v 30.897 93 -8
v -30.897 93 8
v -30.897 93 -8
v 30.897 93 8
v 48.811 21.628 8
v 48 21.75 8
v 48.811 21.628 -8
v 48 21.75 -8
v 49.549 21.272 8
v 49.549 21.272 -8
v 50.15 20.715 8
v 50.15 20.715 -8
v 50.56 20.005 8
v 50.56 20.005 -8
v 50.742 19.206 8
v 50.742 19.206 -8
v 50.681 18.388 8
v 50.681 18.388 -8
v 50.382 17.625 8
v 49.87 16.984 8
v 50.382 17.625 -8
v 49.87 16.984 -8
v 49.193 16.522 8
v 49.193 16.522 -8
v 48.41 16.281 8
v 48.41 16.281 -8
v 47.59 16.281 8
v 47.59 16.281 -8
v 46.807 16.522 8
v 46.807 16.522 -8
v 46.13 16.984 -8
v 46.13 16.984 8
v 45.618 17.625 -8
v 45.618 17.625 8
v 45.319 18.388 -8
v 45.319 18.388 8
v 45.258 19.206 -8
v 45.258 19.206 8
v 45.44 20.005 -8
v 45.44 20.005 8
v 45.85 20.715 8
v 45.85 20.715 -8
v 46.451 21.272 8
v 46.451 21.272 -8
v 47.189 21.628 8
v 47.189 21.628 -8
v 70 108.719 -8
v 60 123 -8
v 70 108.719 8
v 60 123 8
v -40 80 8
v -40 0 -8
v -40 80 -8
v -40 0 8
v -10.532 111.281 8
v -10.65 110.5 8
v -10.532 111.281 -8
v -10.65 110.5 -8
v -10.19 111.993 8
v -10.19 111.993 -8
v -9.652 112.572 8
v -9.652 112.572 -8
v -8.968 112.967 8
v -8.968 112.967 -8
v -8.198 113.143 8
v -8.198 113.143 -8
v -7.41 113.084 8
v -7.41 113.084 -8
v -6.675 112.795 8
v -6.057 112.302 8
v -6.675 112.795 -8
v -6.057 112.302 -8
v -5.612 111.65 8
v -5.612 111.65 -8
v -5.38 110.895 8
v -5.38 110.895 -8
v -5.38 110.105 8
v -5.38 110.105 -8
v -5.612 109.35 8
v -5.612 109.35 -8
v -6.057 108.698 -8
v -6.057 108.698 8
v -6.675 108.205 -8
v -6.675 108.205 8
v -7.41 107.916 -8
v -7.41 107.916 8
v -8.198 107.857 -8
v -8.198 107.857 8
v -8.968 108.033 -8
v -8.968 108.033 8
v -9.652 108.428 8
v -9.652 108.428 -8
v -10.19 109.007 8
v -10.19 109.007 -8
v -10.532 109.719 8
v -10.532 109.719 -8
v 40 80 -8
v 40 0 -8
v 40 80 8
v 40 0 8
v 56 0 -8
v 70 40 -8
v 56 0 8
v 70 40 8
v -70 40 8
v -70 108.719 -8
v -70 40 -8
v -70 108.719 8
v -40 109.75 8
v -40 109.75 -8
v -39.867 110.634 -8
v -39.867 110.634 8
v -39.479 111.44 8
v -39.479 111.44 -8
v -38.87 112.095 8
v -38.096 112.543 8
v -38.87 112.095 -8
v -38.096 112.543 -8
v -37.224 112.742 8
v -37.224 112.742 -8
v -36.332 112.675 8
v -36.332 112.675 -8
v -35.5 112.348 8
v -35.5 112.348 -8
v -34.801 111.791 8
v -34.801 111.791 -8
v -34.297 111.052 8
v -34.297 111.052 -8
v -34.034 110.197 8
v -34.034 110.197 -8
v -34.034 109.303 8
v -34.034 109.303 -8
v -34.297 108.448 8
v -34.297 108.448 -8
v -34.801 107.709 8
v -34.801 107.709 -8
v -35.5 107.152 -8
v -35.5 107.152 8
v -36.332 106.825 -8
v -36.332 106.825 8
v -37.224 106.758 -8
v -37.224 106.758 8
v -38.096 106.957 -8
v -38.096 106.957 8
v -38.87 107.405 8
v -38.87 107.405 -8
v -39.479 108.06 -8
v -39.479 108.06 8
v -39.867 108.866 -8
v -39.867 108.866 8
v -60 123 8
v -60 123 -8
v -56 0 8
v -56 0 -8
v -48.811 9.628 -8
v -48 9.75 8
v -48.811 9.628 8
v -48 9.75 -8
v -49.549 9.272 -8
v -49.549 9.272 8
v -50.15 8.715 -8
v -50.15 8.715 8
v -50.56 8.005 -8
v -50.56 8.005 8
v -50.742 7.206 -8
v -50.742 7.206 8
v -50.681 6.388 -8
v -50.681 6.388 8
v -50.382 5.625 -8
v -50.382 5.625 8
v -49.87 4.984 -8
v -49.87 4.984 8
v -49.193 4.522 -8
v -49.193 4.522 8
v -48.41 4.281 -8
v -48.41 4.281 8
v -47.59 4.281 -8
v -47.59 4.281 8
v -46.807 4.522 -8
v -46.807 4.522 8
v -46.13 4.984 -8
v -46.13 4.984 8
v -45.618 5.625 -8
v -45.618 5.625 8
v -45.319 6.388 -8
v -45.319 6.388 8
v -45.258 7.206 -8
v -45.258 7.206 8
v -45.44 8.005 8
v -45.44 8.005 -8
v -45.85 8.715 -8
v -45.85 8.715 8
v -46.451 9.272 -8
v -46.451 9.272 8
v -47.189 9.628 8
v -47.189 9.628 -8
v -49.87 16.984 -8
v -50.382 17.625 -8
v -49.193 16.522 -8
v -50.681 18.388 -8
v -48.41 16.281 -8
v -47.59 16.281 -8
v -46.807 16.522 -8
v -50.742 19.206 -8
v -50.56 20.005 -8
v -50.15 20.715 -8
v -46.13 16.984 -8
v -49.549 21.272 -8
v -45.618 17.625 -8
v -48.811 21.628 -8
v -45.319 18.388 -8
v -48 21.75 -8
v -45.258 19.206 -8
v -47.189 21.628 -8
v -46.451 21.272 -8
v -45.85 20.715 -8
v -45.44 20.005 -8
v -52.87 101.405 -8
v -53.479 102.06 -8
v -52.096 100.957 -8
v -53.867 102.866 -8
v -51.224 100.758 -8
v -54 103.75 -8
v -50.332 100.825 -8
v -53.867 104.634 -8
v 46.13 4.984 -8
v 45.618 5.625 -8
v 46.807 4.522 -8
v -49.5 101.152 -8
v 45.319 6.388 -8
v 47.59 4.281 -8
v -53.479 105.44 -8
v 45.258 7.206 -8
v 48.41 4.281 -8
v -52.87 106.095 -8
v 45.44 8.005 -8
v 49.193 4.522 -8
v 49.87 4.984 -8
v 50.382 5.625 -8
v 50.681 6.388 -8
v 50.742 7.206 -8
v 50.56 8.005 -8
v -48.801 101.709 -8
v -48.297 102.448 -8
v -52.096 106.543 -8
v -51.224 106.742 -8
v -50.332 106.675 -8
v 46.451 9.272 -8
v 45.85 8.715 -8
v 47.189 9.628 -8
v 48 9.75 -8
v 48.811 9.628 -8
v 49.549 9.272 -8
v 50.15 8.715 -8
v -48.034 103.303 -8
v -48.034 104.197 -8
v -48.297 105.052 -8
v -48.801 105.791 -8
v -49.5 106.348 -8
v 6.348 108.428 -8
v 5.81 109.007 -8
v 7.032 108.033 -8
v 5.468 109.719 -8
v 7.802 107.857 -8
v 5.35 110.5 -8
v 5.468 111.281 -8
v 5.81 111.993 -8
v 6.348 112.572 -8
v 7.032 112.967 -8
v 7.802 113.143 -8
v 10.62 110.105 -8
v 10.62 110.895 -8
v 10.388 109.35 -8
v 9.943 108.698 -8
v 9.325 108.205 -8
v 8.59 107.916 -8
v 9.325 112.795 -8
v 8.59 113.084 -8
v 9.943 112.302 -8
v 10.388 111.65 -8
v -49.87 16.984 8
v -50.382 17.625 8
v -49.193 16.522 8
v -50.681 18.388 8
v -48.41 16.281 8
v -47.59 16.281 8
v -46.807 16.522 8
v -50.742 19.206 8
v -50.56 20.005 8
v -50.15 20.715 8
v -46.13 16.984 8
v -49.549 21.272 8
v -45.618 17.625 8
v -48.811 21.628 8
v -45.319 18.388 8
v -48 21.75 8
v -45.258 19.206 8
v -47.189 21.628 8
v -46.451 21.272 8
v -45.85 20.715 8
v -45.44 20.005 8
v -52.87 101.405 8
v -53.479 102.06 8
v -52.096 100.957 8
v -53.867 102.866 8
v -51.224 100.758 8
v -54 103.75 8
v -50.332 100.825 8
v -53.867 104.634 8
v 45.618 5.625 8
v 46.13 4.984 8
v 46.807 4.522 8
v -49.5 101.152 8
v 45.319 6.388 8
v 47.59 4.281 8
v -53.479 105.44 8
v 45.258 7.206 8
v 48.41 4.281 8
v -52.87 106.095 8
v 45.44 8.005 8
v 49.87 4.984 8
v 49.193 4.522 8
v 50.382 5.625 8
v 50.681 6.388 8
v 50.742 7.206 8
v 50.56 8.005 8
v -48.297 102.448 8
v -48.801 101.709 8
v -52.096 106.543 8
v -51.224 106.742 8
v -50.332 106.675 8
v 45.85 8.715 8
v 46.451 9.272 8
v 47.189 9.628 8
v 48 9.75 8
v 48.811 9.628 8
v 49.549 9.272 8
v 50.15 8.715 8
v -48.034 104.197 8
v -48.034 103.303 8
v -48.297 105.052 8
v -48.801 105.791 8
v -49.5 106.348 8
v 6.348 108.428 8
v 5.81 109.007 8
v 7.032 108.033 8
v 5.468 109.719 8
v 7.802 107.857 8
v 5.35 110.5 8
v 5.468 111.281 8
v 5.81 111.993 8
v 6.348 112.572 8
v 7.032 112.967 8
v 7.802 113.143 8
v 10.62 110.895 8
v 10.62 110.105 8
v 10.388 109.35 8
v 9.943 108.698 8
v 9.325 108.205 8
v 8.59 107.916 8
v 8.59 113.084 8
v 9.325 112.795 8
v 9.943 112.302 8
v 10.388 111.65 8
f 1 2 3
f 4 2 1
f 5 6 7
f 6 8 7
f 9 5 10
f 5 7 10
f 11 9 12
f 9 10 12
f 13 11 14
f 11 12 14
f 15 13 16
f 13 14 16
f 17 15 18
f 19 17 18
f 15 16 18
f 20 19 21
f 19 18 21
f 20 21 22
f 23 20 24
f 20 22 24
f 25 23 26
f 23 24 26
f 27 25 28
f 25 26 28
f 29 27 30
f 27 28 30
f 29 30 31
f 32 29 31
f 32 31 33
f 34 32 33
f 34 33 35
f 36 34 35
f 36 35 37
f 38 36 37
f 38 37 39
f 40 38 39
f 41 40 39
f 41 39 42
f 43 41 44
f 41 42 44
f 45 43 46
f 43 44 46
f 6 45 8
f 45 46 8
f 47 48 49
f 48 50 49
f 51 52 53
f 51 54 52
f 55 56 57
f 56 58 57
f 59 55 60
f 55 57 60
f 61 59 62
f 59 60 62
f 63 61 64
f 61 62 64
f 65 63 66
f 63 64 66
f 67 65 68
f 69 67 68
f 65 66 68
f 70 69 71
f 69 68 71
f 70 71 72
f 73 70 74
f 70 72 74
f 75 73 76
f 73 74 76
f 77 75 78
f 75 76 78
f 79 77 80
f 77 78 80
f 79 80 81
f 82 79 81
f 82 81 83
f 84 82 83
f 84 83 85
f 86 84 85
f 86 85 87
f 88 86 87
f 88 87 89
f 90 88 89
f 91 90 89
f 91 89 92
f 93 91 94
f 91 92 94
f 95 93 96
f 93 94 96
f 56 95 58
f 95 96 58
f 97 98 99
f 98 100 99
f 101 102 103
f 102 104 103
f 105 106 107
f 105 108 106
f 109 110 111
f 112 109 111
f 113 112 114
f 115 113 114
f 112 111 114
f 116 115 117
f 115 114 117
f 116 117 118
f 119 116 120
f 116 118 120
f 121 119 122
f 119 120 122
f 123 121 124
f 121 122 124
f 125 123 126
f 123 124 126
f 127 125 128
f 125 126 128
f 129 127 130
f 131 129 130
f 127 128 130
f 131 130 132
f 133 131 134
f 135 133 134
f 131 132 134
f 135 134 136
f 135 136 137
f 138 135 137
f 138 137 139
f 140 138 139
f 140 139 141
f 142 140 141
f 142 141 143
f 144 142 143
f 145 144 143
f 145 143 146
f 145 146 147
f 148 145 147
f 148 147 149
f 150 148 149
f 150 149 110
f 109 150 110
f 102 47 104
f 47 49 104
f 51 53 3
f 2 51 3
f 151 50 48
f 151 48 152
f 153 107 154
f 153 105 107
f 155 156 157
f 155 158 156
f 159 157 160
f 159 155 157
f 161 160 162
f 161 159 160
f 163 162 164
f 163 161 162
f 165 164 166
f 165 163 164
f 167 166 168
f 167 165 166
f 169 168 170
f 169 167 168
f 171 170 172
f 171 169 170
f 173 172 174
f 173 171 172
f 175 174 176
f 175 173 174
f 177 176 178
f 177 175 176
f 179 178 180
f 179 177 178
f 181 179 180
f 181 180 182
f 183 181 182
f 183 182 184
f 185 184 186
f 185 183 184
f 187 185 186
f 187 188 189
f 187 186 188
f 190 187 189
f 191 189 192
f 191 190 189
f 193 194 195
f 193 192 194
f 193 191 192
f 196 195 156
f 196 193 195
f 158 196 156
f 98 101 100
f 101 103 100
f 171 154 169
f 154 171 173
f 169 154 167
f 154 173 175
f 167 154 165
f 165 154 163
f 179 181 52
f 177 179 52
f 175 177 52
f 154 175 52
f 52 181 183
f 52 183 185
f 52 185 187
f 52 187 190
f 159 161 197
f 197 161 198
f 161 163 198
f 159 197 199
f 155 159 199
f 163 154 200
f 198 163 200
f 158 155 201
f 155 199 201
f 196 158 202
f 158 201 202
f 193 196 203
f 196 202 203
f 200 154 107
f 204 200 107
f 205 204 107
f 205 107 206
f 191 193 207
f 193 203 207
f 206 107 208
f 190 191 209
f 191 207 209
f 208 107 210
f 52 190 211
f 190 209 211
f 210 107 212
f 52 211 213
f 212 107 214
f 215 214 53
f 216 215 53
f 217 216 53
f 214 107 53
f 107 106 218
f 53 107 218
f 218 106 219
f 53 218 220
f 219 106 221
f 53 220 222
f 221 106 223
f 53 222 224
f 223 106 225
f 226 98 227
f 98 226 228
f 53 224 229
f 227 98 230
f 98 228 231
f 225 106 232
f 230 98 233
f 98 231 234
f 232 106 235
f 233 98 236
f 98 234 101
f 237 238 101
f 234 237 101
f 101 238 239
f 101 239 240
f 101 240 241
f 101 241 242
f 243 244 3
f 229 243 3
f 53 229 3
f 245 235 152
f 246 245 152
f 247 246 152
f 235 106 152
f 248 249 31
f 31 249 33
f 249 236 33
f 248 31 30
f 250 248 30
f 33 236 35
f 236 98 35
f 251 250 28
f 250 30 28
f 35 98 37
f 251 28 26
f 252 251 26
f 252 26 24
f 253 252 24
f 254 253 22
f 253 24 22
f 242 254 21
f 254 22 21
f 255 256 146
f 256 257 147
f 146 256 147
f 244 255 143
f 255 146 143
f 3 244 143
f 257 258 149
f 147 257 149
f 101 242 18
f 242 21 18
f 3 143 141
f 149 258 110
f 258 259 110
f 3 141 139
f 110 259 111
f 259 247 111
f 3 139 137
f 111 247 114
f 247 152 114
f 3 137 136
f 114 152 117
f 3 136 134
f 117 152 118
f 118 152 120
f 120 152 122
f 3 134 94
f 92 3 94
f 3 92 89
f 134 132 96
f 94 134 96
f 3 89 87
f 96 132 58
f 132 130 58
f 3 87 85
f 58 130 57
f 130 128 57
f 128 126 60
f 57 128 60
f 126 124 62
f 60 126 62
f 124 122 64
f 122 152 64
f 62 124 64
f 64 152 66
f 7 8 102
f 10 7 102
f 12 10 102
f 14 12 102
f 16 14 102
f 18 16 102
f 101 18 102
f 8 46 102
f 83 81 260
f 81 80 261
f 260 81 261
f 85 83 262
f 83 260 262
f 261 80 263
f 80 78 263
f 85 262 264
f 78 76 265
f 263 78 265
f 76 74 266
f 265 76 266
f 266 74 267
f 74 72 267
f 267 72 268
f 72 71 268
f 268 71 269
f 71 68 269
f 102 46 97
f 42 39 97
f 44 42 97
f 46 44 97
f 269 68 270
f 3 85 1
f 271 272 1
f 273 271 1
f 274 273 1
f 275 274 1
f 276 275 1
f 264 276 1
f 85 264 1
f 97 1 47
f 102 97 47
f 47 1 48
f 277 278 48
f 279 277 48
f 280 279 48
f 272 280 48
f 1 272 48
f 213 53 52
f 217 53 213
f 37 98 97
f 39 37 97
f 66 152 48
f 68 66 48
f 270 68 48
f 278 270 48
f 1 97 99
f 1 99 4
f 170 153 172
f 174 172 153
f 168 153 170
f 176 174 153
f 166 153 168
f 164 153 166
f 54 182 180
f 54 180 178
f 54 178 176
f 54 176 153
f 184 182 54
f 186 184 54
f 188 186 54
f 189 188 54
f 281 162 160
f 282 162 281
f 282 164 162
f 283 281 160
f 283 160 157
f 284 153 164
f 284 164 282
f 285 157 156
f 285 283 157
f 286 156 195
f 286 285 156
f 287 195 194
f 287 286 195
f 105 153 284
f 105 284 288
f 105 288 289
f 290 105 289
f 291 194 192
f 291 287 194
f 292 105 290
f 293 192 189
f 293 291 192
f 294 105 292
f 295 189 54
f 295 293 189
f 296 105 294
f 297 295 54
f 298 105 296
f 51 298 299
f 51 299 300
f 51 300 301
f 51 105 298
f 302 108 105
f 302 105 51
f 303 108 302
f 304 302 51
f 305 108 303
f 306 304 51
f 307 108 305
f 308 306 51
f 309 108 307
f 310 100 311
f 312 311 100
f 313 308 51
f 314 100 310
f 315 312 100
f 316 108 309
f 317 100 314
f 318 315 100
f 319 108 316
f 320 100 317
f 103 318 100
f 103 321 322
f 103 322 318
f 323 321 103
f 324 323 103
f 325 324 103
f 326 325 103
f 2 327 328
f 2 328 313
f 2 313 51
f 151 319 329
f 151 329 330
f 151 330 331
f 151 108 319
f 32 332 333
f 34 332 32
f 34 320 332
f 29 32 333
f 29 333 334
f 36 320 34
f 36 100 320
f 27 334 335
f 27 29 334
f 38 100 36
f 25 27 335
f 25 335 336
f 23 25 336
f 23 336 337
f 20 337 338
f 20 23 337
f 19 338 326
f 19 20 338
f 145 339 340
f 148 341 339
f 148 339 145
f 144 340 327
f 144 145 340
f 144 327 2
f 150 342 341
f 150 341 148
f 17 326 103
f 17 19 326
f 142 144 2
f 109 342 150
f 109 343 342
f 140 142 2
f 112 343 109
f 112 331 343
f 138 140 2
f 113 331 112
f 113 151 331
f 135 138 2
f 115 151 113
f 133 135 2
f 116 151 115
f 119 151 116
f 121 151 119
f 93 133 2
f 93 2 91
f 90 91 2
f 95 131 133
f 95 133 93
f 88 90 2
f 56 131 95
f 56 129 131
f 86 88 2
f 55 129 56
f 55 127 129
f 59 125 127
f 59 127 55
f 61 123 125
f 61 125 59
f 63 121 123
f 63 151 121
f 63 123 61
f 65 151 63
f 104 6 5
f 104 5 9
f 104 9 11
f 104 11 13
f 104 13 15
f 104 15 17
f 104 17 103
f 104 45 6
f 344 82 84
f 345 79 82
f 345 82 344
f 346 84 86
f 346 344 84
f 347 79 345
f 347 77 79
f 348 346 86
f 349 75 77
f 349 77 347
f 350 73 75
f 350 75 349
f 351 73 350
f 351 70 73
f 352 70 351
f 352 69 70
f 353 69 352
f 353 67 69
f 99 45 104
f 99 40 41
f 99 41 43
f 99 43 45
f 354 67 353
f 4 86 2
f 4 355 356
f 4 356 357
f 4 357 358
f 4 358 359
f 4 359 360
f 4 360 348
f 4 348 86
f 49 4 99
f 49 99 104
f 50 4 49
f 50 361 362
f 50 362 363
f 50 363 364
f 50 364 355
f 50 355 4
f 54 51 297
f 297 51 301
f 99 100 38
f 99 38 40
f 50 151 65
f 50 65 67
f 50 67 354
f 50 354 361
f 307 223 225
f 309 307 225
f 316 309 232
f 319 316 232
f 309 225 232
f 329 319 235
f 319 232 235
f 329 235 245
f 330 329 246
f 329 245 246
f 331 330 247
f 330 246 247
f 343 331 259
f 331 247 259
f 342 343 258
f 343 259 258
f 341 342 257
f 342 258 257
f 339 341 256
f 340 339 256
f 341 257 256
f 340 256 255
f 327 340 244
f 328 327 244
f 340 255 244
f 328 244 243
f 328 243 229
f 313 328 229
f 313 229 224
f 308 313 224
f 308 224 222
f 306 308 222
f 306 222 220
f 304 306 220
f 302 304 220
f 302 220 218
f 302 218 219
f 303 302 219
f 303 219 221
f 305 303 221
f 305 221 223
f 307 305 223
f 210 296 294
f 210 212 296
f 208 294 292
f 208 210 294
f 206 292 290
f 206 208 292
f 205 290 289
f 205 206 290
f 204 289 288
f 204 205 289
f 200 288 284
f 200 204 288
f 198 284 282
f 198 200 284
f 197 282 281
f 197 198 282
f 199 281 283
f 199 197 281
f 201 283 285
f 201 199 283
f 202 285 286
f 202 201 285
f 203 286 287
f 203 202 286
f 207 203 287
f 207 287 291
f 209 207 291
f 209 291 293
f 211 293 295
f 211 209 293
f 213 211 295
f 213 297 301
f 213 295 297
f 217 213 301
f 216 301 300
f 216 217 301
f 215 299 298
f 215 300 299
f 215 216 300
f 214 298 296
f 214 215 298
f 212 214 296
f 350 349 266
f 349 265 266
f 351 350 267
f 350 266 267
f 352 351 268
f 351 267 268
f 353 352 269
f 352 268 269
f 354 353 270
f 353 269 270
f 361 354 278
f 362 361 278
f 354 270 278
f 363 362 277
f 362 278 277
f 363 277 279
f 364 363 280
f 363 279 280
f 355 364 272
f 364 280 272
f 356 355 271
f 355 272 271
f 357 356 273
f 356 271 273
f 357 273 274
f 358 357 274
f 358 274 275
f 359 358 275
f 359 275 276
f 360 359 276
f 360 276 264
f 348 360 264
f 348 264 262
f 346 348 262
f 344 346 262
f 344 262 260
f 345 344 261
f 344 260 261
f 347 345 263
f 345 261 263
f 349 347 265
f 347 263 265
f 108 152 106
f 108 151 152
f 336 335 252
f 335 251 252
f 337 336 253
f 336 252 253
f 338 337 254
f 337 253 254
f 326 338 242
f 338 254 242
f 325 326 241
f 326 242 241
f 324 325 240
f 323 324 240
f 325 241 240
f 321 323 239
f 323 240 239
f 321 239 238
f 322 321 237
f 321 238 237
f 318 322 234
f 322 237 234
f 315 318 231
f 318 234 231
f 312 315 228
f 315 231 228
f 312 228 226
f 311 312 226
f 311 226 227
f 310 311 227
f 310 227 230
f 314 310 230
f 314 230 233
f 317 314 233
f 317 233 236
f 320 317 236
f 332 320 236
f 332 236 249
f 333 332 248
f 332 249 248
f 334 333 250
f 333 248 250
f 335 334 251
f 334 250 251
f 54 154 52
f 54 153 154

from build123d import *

# Parameters (mm, degrees)
DODANIE_WYCI_GNI_CIE1_DEPTH                       = 8
POG_BIENIE_WALCOWE_POD_M5_RUB_Z_BEM_W_D           = 5.3
POG_BIENIE_WALCOWE_POD_M5_RUB_Z_BEM_W_DEPTH       = 60
POG_BIENIE_WALCOWE_POD_M5_RUB_Z_BEM_W_CBORE_D     = 10
POG_BIENIE_WALCOWE_POD_M5_RUB_Z_BEM_W_CBORE_DEPTH = 2
POG_BIENIE_WALCOWE_POD_M5_RUB_Z_BEM_W_TIP         = 1.59228064
POG_BIENIE_WALCOWE_POD_M5_RUB_Z_B_2_A_COUNT       = 2
POG_BIENIE_WALCOWE_POD_M5_RUB_Z_B_2_A_PITCH       = 12
OTWORY_USTALAJ_CE_6_0MM1_D                        = 6
OTWORY_USTALAJ_CE_6_0MM1_DEPTH                    = 32
OTWORY_USTALAJ_CE_6_0MM1_TIP                      = 1.802581857


with BuildPart() as part:
    # Szkic1 → Dodanie-wyciągnięcie1 (new, symmetric)
    with BuildSketch(Plane.XY):
        Polygon((0, 93), (0, 123), (60, 123), (70, 108.718519933), (70, 40), (56, 0), (40, 0), (40, 80), (30.897302003, 93), align=None)
    dodanie_wyci_gni_cie1 = extrude(amount=DODANIE_WYCI_GNI_CIE1_DEPTH, both=True)

    # Lustro1: Dodanie-wyciągnięcie1 across plane
    add(dodanie_wyci_gni_cie1.mirror(Plane(origin=(0, 93, 8), x_dir=(0, 0, 1), z_dir=(1, 0, 0))))

    # Pog_bienie walcowe pod M5 _rub_ z _bem w
    with Locations(Plane(origin=(156.349537134, 156, 18.427358502), x_dir=(1, 0, 0), z_dir=(0, 0, 1))):
        with Locations((-164.349537134, -45.5), (-148.349537134, -45.5)):
            CounterBoreHole(POG_BIENIE_WALCOWE_POD_M5_RUB_Z_BEM_W_D / 2, POG_BIENIE_WALCOWE_POD_M5_RUB_Z_BEM_W_CBORE_D / 2, POG_BIENIE_WALCOWE_POD_M5_RUB_Z_BEM_W_CBORE_DEPTH, depth=POG_BIENIE_WALCOWE_POD_M5_RUB_Z_BEM_W_DEPTH)
            with Locations((0, 0, -(POG_BIENIE_WALCOWE_POD_M5_RUB_Z_BEM_W_DEPTH + POG_BIENIE_WALCOWE_POD_M5_RUB_Z_BEM_W_TIP / 2))):  # 118° drill point
                Cone(0, POG_BIENIE_WALCOWE_POD_M5_RUB_Z_BEM_W_D / 2, POG_BIENIE_WALCOWE_POD_M5_RUB_Z_BEM_W_TIP, mode=Mode.SUBTRACT)

    # Szkic9 → Pog_bienie walcowe pod M5 _rub_ z _b 2 (revolve, cut)
    with BuildSketch(Plane(origin=(-48, 7, -22), x_dir=(0, 1, 0), z_dir=(1, 0, 0))):
        Polygon((0, 0), (0, 45.652366702), (2.75, 44), (2.75, 5), (5, 5), (5, 0), align=None)
    pog_bienie_walcowe_pod_m5_rub_z_b_2 = revolve(axis=Axis((-48, 7, -28.35), (0, 0, 1)), mode=Mode.SUBTRACT)

    # Pog_bienie walcowe pod M5 _rub_ z _b 2 a: Pog_bienie walcowe pod M5 _rub_ z _b 2 ×2
    with Locations(*[(0, i * POG_BIENIE_WALCOWE_POD_M5_RUB_Z_B_2_A_PITCH, 0) for i in range(1, POG_BIENIE_WALCOWE_POD_M5_RUB_Z_B_2_A_COUNT)]):
        add(pog_bienie_walcowe_pod_m5_rub_z_b_2, mode=Mode.SUBTRACT)

    # Lustro2: Pog_bienie walcowe pod M5 _rub_ z _b 2 across plane
    add(pog_bienie_walcowe_pod_m5_rub_z_b_2.mirror(Plane(origin=(0, 0, 0), x_dir=(0, 0, 1), z_dir=(1, 0, 0))), mode=Mode.SUBTRACT)

    # Lustro2 copy 1 sketch → Lustro2 copy 1 (revolve, cut)
    with BuildSketch(Plane(origin=(48, 19, -22), x_dir=(0, 1, 0), z_dir=(-1, 0, 0))):
        Polygon((0, 0), (0, -45.652366702), (2.75, -44), (2.75, -5), (5, -5), (5, 0), align=None)
    revolve(axis=Axis((48, 19, -28.35), (0, 0, -1)), mode=Mode.SUBTRACT)

    # Otwory ustalające Ø6.0mm1
    with Locations(Plane(origin=(156.349537134, 156, 8), x_dir=(1, 0, 0), z_dir=(0, 0, 1))):
        with Locations((-193.349537133, -46.25), (-207.349537133, -52.25)):
            Hole(OTWORY_USTALAJ_CE_6_0MM1_D / 2, depth=OTWORY_USTALAJ_CE_6_0MM1_DEPTH)
            with Locations((0, 0, -(OTWORY_USTALAJ_CE_6_0MM1_DEPTH + OTWORY_USTALAJ_CE_6_0MM1_TIP / 2))):  # 118° drill point
                Cone(0, OTWORY_USTALAJ_CE_6_0MM1_D / 2, OTWORY_USTALAJ_CE_6_0MM1_TIP, mode=Mode.SUBTRACT)


solid = part.part
